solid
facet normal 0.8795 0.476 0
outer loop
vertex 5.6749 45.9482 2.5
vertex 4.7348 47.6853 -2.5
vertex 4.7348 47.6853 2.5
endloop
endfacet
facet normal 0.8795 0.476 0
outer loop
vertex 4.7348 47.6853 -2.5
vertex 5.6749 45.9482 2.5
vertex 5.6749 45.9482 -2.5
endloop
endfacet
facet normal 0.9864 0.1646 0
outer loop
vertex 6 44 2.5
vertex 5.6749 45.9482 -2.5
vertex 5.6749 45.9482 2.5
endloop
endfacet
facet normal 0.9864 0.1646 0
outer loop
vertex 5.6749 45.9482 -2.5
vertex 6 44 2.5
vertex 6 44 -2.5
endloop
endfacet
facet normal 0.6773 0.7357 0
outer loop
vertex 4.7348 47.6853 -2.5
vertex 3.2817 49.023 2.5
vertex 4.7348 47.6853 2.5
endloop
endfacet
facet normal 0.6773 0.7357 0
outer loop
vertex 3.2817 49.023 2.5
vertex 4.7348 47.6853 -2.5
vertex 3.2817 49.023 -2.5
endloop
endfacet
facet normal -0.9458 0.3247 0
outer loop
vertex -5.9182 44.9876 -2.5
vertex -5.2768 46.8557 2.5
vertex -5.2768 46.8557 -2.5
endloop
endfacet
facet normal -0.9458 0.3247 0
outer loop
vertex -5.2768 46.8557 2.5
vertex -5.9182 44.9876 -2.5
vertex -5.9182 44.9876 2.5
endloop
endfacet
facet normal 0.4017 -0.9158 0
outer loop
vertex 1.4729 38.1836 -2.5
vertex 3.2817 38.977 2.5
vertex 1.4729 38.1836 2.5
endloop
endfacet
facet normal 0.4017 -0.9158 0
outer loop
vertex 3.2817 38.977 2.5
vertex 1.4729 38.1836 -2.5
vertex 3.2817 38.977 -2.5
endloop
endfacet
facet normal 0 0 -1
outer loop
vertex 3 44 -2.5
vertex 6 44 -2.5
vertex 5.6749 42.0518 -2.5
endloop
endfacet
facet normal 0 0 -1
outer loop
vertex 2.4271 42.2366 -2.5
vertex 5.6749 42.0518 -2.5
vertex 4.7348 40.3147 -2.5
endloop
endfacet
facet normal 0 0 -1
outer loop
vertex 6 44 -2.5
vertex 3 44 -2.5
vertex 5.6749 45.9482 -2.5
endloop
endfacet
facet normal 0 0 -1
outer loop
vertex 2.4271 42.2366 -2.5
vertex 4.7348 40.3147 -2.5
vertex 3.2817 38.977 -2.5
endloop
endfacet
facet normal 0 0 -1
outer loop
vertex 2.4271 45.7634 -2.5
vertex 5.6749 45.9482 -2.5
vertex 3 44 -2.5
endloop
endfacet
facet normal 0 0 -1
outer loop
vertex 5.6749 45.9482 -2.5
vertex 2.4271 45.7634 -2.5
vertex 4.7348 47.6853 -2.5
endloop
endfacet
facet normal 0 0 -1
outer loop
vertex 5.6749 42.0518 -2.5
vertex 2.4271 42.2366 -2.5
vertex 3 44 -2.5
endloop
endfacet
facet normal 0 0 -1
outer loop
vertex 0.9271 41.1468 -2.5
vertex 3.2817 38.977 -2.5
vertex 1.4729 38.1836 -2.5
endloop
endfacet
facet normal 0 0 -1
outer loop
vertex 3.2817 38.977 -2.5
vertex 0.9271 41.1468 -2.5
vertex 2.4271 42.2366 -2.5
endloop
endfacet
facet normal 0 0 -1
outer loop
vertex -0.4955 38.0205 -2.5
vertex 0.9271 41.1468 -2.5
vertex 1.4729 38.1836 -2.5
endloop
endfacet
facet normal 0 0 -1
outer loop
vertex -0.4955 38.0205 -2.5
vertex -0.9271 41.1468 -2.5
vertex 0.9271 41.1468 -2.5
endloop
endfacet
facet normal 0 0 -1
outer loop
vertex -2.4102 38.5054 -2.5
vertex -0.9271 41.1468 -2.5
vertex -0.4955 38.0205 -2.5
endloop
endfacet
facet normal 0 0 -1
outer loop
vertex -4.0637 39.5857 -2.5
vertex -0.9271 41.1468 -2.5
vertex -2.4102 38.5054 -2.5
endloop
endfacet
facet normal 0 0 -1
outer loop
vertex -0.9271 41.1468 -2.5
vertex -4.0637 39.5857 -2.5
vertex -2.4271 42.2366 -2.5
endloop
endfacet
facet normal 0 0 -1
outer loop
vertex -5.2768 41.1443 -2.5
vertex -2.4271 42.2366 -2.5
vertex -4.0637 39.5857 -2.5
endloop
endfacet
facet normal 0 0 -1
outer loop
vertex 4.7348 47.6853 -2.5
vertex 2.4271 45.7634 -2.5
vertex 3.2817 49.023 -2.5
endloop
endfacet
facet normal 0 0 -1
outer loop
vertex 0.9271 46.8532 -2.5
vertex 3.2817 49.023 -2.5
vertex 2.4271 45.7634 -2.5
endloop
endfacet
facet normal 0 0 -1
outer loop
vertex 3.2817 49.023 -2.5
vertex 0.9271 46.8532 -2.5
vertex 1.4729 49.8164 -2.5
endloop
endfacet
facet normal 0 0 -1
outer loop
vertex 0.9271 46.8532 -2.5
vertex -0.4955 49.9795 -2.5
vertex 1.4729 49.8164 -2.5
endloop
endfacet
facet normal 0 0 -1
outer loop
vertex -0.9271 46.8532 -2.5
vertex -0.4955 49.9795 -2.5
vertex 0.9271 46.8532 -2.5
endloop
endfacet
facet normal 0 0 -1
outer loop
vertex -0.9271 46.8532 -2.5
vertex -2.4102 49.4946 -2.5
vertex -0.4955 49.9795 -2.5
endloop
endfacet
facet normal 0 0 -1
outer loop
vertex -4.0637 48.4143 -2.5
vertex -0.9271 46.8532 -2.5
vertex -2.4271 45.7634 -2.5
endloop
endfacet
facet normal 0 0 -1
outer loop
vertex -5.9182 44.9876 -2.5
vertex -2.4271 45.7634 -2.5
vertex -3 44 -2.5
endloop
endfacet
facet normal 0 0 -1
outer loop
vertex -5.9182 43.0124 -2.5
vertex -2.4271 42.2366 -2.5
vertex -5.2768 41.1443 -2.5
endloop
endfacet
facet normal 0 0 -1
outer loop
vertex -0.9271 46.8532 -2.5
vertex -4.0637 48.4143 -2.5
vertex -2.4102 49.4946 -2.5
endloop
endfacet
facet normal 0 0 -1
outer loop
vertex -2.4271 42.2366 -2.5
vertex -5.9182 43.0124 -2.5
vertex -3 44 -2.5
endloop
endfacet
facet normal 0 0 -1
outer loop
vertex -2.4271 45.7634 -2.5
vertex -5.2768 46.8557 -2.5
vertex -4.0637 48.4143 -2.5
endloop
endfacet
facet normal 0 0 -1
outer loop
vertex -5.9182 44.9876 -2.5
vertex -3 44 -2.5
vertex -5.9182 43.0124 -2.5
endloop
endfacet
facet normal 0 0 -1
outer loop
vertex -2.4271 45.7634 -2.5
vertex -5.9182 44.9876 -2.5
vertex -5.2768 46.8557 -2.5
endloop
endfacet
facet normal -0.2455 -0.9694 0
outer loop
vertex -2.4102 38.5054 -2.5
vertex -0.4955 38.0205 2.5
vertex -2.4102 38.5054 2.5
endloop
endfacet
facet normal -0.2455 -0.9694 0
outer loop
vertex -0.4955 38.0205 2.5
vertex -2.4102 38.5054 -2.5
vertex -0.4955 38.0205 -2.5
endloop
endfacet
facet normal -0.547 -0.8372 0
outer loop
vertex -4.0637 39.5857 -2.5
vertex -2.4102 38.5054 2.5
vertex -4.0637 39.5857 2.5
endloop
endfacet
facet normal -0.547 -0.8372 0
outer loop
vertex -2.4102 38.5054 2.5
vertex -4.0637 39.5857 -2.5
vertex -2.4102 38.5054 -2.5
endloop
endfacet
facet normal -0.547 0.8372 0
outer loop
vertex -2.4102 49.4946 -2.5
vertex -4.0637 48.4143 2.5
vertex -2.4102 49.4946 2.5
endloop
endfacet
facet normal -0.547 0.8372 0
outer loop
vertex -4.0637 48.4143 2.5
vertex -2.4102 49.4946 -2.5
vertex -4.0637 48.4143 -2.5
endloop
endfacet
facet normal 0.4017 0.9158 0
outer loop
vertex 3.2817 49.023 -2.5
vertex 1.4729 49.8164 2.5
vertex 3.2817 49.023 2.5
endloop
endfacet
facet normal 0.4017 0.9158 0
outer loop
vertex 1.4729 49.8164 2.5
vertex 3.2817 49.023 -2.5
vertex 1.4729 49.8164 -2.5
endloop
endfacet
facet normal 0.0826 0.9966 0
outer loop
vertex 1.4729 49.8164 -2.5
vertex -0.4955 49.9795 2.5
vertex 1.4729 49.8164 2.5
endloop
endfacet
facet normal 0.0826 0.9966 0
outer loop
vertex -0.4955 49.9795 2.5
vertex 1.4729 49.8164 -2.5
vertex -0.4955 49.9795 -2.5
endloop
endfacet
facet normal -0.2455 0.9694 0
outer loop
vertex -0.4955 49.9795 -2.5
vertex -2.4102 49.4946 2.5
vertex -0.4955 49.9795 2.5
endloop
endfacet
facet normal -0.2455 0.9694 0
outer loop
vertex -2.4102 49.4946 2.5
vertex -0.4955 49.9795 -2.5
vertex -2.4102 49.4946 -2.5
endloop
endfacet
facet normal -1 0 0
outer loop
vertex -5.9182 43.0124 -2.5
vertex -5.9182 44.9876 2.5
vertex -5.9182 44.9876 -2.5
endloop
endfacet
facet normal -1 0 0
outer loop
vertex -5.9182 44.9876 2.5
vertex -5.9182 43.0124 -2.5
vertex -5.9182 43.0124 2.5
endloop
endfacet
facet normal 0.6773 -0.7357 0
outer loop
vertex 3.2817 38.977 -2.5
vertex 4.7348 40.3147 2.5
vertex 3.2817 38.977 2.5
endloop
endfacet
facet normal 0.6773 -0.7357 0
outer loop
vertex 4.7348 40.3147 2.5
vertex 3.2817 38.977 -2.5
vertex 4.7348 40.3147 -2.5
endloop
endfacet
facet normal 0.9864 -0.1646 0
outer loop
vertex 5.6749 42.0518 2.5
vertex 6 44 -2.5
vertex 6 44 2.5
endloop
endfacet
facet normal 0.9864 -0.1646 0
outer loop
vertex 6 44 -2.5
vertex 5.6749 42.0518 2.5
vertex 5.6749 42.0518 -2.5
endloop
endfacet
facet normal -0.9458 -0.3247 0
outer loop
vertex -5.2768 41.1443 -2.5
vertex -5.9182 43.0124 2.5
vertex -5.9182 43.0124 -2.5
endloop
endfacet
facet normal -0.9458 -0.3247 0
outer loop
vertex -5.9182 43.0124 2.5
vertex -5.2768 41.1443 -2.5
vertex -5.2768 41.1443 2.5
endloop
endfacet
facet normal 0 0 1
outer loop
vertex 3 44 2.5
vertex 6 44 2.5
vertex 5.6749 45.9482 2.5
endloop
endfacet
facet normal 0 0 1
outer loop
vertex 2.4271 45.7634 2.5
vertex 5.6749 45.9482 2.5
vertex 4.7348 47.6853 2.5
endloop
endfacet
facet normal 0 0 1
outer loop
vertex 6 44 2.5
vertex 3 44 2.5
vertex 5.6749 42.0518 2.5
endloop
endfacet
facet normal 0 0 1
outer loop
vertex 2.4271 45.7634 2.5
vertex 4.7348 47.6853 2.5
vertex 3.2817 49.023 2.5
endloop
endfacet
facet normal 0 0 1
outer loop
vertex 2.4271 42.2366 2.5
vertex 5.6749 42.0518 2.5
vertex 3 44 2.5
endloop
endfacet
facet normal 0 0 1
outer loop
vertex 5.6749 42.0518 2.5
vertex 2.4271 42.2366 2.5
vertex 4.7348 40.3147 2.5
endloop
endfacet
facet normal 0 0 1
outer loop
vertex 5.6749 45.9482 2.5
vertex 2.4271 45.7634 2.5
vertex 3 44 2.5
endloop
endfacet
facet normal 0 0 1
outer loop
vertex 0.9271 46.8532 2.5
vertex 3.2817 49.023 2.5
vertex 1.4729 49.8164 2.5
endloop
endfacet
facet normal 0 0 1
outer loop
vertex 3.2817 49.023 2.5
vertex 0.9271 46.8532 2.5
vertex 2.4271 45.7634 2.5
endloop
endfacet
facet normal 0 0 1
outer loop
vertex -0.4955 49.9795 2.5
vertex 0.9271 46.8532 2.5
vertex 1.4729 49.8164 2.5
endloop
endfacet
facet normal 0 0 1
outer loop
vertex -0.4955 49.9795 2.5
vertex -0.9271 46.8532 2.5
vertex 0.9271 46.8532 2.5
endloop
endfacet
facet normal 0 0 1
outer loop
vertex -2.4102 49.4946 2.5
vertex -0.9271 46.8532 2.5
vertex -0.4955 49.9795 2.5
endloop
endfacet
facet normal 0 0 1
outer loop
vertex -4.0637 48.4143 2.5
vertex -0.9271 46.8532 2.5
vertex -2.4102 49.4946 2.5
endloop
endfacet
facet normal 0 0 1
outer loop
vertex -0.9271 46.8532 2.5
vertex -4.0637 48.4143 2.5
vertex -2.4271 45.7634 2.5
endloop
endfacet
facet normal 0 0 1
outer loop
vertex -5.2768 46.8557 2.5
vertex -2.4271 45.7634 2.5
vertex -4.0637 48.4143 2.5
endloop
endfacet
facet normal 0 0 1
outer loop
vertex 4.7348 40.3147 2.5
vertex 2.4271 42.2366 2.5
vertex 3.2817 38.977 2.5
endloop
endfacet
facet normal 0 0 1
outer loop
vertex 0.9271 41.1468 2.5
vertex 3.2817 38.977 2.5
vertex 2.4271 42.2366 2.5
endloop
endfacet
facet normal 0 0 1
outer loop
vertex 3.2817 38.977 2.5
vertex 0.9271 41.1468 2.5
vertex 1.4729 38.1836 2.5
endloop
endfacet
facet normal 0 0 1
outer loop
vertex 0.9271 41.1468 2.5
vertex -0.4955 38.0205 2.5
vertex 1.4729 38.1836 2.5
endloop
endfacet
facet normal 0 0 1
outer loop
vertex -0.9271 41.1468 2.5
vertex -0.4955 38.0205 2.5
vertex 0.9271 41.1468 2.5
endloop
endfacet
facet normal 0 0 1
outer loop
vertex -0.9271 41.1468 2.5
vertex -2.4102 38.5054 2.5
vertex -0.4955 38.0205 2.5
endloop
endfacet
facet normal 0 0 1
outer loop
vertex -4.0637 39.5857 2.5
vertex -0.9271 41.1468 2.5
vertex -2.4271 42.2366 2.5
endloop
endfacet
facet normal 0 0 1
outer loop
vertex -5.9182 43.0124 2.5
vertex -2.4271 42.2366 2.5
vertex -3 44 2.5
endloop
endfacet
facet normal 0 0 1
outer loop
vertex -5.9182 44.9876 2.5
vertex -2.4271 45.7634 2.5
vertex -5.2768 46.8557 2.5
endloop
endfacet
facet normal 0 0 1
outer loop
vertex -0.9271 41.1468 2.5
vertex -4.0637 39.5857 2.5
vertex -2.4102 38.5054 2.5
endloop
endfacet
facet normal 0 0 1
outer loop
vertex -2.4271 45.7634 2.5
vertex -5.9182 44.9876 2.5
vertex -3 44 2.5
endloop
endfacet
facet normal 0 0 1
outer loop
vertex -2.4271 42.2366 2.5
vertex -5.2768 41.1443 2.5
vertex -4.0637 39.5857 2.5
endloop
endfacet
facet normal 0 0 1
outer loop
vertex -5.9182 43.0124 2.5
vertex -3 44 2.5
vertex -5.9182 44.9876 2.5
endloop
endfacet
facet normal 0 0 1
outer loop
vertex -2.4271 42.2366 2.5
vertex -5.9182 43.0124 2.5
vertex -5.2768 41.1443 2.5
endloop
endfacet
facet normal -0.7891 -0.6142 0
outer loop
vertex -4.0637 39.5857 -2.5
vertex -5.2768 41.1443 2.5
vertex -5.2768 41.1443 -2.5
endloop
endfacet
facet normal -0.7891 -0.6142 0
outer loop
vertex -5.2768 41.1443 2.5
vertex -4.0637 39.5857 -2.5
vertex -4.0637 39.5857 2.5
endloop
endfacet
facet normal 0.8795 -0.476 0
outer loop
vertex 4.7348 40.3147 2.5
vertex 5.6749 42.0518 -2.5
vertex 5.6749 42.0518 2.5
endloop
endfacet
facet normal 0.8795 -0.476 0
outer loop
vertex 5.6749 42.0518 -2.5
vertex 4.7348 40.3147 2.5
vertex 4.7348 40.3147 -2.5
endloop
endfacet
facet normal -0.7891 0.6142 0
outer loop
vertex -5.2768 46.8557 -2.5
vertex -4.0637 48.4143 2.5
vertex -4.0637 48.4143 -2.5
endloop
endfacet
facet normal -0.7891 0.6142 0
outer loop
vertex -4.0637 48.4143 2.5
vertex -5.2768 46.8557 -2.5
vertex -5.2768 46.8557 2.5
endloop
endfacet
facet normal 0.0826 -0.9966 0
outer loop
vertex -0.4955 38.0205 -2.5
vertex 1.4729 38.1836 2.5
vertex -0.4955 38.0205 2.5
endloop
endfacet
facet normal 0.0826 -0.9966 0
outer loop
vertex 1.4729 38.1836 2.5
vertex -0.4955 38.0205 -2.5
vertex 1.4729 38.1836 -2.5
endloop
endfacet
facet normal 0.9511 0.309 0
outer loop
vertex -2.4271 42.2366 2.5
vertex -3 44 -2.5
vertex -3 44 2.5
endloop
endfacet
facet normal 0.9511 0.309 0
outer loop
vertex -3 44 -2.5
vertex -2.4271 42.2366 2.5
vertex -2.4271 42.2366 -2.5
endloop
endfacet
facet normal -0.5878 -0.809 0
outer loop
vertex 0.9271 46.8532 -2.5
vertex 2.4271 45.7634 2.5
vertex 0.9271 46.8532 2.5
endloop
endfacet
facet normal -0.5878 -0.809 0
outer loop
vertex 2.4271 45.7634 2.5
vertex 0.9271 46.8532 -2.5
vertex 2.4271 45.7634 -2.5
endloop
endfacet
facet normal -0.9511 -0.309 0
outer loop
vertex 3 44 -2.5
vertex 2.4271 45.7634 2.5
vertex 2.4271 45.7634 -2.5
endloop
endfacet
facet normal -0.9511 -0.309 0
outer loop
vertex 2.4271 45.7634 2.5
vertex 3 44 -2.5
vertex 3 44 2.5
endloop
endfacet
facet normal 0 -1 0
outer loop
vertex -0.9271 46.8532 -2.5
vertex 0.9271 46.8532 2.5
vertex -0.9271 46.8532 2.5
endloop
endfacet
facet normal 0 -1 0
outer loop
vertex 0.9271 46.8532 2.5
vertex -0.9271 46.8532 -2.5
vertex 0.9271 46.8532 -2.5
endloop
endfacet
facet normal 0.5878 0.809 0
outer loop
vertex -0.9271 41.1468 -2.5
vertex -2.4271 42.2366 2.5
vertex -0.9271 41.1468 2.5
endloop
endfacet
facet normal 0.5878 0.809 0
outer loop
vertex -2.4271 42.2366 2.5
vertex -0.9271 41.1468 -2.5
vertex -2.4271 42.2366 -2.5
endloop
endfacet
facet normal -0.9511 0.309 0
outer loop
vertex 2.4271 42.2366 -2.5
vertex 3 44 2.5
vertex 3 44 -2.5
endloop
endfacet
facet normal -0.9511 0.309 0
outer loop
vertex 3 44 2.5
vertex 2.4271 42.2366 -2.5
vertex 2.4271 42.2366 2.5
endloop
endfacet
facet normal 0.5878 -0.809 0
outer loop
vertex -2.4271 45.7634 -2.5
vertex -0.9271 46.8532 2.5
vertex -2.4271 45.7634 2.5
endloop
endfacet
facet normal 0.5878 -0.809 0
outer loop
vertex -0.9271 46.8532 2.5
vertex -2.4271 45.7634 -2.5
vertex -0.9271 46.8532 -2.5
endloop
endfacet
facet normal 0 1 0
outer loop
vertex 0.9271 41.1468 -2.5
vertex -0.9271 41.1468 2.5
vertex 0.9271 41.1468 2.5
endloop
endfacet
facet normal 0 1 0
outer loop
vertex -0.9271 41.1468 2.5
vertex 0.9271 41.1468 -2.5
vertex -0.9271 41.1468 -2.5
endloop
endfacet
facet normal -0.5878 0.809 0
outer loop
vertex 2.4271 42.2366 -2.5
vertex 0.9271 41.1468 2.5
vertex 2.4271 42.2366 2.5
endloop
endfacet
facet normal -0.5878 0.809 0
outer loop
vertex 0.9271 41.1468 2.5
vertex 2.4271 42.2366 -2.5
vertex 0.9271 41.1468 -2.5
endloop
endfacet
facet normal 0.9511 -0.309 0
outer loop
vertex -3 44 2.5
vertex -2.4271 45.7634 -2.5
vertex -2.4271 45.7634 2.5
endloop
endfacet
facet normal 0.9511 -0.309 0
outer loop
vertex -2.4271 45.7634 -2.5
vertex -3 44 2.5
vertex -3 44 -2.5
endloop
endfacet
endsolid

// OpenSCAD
h = 5;
filename = "leaf.dxf";
scale = 0.3;

module feature(){
		translate([1,29,0])scale([scale*1.2,scale,1])translate([0,0,-h/2])linear_extrude(height = h) import(filename);
}

module six_feature(){
	union() {
		for(i = [0:360 / 6:360]){
			rotate([0,0,i]) feature();
		}
	}
}

module base(){
	difference(){
		scale([0.7,0.7,1]) translate([0,0,-h/2])linear_extrude(height = h) import("snowflake.dxf");
		cut();
	}
}


module loop() {
	translate([0,44,0]) {
		union(){
			difference() {
				cylinder(h,6,6, center = true);
				cylinder(h,3,3, center = true);
			}
			//translate([0,-8,0])cube([5,8,5], center = true);
		}
	}
}

module cut() {
	translate([0,0,-5])
	difference() {
		cylinder(2 * h,80,80);
		cylinder(2 * h,20,20);
	}
}

union() {
	six_feature();
	base();
	loop();
}

//translate([0,0,-5]) color([0,1,0]) cylinder(h,40,40);
